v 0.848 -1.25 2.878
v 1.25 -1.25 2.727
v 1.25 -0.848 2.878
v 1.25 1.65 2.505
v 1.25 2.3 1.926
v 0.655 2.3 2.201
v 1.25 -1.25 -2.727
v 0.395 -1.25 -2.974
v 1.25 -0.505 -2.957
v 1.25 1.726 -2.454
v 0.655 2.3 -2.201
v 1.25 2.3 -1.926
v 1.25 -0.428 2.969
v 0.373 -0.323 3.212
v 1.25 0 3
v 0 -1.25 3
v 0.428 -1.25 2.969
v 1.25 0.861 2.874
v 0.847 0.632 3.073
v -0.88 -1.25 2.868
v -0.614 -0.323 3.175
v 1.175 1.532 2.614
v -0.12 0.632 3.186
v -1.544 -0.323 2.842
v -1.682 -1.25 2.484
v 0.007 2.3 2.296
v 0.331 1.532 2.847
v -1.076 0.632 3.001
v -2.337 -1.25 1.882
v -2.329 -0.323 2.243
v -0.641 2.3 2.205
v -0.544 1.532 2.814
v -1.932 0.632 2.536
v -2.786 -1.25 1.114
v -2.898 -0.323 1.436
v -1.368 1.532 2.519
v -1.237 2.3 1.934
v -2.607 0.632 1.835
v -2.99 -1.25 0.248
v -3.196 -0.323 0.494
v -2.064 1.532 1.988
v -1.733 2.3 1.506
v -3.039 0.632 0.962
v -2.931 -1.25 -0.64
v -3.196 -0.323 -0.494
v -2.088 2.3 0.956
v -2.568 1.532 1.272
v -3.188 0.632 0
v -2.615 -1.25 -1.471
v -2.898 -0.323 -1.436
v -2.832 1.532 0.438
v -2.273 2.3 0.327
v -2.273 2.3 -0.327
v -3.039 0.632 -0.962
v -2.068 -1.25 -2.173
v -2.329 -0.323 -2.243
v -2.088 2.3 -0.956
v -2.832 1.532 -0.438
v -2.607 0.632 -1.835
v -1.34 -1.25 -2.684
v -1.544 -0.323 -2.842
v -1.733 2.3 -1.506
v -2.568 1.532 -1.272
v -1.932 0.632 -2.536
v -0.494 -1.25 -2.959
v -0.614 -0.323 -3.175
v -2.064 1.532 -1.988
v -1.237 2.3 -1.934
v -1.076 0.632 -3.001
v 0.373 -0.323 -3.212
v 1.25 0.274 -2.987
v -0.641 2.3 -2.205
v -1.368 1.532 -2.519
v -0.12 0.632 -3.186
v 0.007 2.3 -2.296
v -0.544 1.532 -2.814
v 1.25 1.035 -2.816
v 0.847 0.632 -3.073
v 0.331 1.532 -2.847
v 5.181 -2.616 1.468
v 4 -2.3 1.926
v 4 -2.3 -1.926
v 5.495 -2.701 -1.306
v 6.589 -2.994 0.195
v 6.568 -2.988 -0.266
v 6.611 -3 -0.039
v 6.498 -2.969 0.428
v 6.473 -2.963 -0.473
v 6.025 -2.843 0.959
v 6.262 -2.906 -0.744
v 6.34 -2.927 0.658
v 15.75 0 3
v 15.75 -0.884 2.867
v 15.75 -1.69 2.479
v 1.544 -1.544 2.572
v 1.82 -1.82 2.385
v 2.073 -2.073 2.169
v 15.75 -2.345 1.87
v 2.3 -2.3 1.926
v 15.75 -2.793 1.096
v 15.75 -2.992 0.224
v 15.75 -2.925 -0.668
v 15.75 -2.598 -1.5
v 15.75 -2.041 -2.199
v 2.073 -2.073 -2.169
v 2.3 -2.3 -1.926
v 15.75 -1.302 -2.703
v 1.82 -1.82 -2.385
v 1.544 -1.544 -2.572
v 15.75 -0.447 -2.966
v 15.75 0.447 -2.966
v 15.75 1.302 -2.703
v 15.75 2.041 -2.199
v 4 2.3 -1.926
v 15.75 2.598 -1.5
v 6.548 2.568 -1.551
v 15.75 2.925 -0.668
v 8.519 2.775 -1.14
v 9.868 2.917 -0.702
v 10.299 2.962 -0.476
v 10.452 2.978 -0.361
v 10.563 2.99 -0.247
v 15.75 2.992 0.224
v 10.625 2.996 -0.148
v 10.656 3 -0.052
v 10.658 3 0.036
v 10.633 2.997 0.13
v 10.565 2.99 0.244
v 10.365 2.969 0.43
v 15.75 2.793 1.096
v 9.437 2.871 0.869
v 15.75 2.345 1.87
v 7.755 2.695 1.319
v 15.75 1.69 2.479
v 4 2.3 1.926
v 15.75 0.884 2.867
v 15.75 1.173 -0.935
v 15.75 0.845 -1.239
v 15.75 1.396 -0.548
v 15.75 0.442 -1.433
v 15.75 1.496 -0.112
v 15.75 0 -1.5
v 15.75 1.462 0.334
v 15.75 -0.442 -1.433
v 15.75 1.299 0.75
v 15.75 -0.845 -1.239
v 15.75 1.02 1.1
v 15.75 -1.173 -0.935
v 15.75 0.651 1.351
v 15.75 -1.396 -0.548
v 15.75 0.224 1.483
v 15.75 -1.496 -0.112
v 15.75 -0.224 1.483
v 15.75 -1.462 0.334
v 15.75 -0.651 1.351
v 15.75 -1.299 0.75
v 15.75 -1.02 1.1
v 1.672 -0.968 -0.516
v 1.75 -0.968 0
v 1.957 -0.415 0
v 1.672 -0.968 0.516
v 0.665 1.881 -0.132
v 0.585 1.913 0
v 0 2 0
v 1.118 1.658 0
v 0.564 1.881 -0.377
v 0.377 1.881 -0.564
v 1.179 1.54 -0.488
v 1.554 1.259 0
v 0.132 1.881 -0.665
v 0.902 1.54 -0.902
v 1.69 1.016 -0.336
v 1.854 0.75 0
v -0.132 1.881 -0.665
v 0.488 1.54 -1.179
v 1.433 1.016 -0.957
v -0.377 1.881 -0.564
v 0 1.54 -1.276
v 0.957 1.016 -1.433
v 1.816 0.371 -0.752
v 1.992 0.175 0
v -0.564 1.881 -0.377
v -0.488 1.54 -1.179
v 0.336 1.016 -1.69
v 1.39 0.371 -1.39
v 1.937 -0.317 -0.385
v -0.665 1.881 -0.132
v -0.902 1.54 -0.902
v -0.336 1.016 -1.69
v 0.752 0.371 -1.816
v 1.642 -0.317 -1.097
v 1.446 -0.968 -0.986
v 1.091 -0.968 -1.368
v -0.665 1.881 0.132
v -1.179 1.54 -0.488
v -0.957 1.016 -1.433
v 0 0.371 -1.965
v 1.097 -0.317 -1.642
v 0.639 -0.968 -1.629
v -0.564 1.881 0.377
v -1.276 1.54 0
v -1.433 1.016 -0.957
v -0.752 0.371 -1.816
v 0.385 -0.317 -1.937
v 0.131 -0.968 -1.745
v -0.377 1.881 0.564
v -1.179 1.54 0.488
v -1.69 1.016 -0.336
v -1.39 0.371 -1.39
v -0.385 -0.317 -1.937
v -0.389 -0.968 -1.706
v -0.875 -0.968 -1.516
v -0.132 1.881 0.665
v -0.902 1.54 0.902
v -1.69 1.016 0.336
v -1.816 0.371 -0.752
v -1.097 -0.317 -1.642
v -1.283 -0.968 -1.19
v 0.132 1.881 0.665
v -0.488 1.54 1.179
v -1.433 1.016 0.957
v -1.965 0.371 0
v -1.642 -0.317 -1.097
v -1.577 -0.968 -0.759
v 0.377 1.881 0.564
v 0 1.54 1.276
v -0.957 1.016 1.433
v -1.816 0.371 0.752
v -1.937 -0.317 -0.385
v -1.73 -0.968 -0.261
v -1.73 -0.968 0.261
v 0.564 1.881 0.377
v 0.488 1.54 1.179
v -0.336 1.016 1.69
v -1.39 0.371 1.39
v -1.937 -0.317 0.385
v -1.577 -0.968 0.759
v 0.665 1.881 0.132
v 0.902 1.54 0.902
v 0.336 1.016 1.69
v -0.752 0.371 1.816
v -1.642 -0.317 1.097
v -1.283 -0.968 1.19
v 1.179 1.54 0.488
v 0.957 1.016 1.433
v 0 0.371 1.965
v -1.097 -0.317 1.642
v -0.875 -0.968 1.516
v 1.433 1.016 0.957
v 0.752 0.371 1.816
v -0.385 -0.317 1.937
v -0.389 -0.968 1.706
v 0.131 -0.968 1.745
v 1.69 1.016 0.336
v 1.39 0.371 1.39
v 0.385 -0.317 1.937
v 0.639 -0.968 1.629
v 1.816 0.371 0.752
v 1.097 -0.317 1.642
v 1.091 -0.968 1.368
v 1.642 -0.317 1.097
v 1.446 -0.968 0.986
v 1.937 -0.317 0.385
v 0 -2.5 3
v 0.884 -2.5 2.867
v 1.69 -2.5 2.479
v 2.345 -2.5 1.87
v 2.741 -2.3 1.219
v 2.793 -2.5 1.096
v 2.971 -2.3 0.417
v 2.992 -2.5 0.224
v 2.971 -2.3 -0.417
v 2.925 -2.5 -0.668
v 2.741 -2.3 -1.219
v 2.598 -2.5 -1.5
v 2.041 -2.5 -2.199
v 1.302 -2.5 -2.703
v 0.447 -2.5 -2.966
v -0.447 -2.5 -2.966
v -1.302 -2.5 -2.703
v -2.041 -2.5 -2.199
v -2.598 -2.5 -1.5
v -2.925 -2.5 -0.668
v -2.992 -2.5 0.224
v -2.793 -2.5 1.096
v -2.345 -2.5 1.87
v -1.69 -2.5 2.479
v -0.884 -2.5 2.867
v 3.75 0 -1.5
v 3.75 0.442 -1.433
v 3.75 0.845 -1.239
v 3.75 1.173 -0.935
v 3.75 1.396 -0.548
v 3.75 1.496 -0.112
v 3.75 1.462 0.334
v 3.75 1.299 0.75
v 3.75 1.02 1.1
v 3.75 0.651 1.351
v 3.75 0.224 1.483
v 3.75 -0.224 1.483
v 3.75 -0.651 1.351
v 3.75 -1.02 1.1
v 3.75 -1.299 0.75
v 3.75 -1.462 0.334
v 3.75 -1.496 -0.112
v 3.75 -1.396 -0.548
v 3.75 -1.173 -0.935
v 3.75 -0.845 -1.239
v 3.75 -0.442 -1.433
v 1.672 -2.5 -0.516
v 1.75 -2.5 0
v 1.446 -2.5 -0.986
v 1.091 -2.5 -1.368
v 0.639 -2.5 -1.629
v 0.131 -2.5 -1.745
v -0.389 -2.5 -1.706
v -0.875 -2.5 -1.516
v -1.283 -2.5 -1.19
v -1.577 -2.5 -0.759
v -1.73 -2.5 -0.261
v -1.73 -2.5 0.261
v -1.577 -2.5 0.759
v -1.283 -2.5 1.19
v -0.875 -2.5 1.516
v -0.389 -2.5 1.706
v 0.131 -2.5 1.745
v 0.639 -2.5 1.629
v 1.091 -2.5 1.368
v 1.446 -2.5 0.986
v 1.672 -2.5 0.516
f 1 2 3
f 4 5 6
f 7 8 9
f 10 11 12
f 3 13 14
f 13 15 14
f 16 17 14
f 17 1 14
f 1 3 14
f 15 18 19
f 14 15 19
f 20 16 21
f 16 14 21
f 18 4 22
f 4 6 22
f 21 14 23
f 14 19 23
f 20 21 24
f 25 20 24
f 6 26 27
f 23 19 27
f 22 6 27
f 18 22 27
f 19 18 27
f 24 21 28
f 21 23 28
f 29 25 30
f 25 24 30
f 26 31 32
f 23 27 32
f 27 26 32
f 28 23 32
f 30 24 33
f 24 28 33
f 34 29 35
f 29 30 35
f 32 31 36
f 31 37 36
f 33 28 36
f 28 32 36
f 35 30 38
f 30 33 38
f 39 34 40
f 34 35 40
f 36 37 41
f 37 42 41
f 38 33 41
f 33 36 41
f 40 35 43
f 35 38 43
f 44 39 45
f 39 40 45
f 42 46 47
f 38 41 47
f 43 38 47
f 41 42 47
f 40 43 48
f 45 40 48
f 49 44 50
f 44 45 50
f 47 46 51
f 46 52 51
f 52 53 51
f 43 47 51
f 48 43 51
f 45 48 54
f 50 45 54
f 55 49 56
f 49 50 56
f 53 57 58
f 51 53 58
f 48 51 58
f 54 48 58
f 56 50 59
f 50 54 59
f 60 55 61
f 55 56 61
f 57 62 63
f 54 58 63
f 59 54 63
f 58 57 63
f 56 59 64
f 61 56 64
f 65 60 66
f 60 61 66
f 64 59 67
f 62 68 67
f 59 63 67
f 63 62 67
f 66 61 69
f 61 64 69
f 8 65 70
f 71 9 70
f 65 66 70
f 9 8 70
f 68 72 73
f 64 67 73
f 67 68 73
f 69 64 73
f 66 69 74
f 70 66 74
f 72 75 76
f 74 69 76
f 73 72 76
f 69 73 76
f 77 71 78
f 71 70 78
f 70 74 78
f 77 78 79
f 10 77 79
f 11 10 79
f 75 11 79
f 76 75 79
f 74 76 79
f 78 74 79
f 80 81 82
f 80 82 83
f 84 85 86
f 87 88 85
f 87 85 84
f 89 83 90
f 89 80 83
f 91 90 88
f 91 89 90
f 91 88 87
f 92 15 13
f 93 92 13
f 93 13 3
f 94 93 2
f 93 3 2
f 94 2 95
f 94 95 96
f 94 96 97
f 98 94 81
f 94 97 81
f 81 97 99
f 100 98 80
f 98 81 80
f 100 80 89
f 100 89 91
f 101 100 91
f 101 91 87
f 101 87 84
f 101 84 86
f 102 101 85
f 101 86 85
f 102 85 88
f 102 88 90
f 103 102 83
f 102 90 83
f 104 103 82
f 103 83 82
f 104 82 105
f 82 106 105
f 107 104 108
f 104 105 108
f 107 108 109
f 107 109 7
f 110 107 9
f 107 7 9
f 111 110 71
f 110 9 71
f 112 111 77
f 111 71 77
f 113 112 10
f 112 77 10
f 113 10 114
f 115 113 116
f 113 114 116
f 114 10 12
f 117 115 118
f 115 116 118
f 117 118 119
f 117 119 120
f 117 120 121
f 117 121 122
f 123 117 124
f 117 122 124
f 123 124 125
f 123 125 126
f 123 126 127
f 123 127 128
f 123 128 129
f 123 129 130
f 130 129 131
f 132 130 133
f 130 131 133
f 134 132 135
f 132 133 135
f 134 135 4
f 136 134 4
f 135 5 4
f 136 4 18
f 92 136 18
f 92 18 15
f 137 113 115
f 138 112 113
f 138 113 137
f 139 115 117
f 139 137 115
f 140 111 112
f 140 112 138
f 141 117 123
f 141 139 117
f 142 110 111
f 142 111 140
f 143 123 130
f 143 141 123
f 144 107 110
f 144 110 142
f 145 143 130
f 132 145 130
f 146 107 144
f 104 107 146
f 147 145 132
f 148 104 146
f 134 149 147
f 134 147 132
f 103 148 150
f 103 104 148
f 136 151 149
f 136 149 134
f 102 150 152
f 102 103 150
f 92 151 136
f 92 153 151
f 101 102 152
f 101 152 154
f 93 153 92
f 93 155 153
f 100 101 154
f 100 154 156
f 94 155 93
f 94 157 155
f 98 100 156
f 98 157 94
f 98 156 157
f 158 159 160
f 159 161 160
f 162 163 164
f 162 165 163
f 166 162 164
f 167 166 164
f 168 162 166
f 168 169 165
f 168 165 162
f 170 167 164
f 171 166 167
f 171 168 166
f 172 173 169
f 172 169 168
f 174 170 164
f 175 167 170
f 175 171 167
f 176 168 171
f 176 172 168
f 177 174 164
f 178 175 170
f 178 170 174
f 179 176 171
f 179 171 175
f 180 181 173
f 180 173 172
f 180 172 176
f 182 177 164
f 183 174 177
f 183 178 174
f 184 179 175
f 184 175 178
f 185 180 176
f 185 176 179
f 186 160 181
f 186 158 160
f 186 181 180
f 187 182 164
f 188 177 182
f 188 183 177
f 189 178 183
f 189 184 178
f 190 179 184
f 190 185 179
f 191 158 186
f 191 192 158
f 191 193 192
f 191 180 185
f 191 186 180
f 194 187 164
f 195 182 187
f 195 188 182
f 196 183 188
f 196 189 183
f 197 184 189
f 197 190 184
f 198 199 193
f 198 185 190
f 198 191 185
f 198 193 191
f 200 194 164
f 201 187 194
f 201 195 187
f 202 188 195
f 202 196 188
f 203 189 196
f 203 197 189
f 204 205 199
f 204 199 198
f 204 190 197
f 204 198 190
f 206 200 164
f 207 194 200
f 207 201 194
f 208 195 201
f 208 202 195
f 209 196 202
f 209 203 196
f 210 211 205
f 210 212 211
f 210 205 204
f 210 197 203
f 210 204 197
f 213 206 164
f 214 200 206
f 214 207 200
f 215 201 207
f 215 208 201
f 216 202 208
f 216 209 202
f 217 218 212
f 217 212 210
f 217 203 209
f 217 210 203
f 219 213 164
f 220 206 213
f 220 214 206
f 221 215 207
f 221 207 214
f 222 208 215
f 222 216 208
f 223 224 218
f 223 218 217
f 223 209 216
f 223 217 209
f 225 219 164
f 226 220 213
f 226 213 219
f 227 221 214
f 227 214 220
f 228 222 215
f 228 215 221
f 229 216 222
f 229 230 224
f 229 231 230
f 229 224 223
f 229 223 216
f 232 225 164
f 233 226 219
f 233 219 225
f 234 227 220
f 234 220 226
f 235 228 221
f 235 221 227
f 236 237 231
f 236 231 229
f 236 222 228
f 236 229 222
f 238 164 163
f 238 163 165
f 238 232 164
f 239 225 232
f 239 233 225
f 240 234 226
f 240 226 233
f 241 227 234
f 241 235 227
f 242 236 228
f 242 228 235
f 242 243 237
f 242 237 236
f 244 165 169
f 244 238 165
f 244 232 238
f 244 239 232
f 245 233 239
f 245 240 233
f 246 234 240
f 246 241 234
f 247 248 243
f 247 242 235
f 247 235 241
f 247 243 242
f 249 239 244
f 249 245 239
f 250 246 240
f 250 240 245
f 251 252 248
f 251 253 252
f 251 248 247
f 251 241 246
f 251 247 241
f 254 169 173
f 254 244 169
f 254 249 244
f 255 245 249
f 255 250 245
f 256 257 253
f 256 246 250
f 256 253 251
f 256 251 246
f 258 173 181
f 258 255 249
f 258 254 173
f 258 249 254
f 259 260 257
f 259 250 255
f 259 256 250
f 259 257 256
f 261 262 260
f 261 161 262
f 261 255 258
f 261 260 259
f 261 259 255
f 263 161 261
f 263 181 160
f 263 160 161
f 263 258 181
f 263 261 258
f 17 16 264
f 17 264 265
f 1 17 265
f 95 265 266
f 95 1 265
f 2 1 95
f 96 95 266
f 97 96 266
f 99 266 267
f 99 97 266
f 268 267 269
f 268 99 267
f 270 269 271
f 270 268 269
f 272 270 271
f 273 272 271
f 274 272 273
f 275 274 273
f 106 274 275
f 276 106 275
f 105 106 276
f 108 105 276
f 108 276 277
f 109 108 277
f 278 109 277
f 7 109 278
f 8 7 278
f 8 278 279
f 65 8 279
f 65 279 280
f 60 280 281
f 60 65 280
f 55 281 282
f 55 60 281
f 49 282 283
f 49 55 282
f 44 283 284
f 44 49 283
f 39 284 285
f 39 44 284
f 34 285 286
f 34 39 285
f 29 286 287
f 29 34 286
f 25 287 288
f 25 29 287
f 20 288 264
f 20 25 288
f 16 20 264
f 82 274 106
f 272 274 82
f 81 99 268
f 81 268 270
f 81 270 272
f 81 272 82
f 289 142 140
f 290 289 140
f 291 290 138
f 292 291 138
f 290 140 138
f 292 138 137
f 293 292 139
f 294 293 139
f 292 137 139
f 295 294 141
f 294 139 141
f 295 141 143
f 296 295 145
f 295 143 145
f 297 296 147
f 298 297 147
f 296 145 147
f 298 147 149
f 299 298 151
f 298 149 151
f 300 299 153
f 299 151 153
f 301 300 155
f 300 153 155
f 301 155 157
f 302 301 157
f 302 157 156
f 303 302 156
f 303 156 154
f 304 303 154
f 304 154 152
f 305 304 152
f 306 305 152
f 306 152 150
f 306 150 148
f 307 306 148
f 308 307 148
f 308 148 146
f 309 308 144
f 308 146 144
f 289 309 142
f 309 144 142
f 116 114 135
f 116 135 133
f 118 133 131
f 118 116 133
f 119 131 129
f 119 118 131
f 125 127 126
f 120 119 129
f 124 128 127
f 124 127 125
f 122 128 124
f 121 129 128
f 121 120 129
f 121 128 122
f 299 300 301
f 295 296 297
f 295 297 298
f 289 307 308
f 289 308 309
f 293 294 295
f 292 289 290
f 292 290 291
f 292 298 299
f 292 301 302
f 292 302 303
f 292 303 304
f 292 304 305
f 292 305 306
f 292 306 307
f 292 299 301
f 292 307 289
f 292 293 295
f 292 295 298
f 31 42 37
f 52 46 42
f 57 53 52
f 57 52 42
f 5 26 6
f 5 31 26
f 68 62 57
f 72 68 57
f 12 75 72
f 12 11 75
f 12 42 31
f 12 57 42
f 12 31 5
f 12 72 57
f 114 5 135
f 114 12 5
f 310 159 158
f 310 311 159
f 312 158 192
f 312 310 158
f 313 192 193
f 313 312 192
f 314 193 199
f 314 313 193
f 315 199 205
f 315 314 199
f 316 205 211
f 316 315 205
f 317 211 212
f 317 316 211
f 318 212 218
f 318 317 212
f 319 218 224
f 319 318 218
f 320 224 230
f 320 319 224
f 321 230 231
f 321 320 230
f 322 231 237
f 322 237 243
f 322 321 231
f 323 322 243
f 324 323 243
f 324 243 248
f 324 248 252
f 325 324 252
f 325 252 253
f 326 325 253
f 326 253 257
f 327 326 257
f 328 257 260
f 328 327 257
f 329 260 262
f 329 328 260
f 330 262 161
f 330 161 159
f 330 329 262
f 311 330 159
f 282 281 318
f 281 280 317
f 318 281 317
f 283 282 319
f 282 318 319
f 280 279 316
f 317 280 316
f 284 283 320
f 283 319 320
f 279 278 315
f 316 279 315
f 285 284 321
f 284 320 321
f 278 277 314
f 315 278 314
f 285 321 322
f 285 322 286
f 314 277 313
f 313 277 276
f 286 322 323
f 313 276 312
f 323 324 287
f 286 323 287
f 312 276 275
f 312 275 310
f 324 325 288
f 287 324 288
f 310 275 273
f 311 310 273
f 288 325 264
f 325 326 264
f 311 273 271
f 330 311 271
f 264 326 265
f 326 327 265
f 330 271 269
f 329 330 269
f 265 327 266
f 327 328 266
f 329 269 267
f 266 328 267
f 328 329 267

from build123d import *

# Parameters (mm, degrees)
ESQUISSE2_R             = 3
BOSS_EXTRU_1_DEPTH      = 15.75
ESQUISSE3_R             = 1.5
ENL_V_MAT_EXTRU_1_DEPTH = 12
ENL_V_MAT_EXTRU_2_DEPTH = 6
ESQUISSE5_R             = 3
BOSS_EXTRU_2_DEPTH      = 2.5


with BuildPart() as part:
    # Esquisse1 → Révolution1 (revolve)
    with BuildSketch(Plane.XY):
        with BuildLine():
            Line((0, 3.25), (0, -3.25))
            ThreePointArc((0, -3.25), (-3.25, 0), (0, 3.25))
        make_face()
    revolve(axis=Axis((0, 3.25, 0), (0, -1, 0)))

    # Esquisse2 → Boss.-Extru.1 (add)
    with BuildSketch(Plane(origin=(0, 0, 0), x_dir=(0, 0, -1), z_dir=(1, 0, 0))):
        with Locations(Location((0, 0, 0), (0, 0, 180))):
            Circle(ESQUISSE2_R)
    extrude(amount=BOSS_EXTRU_1_DEPTH)

    # Esquisse3 → Enlèv. mat.-Extru.1 (cut)
    with BuildSketch(Plane(origin=(15.75, 0, 0), x_dir=(0, 0, -1), z_dir=(1, 0, 0))):
        Circle(ESQUISSE3_R)
    extrude(amount=-ENL_V_MAT_EXTRU_1_DEPTH, mode=Mode.SUBTRACT)

    # Esquisse4 → Enlèv. mat.-Extru.2 (cut, symmetric)
    with BuildSketch(Plane.XY):
        Polygon((-2.296192501, 2.3), (4, 2.3), (13.038646232, 3.25), (-2.296192501, 3.25), align=None)
        Polygon((-2.296192501, -2.3), (4, -2.3), (7.545448267, -3.25), (-2.296192501, -3.25), align=None)
    extrude(amount=ENL_V_MAT_EXTRU_2_DEPTH, both=True, mode=Mode.SUBTRACT)

    # Esquisse5 → Boss.-Extru.2 (add)
    with BuildSketch(Plane(origin=(0, 0, 0), x_dir=(1, 0, 0), z_dir=(0, 1, 0))):
        with Locations(Location((0, 0, 0), (0, 0, 270))):
            Circle(ESQUISSE5_R)
    extrude(amount=-BOSS_EXTRU_2_DEPTH)

    # Esquisse6 → Enlèvement de matière-Révolution1 (revolve, cut)
    with BuildSketch(Plane.XY):
        with BuildLine():
            Line((1.75, -0.968245837), (1.75, -2.5))
            Line((1.75, -2.5), (0, -2.5))
            Line((0, -2.5), (0, 2))
            ThreePointArc((0, 2), (1.722859784, 1.015753003), (1.75, -0.968245837))
        make_face()
    revolve(axis=Axis((0, -2.5, 0), (0, 1, 0)), mode=Mode.SUBTRACT)


solid = part.part
